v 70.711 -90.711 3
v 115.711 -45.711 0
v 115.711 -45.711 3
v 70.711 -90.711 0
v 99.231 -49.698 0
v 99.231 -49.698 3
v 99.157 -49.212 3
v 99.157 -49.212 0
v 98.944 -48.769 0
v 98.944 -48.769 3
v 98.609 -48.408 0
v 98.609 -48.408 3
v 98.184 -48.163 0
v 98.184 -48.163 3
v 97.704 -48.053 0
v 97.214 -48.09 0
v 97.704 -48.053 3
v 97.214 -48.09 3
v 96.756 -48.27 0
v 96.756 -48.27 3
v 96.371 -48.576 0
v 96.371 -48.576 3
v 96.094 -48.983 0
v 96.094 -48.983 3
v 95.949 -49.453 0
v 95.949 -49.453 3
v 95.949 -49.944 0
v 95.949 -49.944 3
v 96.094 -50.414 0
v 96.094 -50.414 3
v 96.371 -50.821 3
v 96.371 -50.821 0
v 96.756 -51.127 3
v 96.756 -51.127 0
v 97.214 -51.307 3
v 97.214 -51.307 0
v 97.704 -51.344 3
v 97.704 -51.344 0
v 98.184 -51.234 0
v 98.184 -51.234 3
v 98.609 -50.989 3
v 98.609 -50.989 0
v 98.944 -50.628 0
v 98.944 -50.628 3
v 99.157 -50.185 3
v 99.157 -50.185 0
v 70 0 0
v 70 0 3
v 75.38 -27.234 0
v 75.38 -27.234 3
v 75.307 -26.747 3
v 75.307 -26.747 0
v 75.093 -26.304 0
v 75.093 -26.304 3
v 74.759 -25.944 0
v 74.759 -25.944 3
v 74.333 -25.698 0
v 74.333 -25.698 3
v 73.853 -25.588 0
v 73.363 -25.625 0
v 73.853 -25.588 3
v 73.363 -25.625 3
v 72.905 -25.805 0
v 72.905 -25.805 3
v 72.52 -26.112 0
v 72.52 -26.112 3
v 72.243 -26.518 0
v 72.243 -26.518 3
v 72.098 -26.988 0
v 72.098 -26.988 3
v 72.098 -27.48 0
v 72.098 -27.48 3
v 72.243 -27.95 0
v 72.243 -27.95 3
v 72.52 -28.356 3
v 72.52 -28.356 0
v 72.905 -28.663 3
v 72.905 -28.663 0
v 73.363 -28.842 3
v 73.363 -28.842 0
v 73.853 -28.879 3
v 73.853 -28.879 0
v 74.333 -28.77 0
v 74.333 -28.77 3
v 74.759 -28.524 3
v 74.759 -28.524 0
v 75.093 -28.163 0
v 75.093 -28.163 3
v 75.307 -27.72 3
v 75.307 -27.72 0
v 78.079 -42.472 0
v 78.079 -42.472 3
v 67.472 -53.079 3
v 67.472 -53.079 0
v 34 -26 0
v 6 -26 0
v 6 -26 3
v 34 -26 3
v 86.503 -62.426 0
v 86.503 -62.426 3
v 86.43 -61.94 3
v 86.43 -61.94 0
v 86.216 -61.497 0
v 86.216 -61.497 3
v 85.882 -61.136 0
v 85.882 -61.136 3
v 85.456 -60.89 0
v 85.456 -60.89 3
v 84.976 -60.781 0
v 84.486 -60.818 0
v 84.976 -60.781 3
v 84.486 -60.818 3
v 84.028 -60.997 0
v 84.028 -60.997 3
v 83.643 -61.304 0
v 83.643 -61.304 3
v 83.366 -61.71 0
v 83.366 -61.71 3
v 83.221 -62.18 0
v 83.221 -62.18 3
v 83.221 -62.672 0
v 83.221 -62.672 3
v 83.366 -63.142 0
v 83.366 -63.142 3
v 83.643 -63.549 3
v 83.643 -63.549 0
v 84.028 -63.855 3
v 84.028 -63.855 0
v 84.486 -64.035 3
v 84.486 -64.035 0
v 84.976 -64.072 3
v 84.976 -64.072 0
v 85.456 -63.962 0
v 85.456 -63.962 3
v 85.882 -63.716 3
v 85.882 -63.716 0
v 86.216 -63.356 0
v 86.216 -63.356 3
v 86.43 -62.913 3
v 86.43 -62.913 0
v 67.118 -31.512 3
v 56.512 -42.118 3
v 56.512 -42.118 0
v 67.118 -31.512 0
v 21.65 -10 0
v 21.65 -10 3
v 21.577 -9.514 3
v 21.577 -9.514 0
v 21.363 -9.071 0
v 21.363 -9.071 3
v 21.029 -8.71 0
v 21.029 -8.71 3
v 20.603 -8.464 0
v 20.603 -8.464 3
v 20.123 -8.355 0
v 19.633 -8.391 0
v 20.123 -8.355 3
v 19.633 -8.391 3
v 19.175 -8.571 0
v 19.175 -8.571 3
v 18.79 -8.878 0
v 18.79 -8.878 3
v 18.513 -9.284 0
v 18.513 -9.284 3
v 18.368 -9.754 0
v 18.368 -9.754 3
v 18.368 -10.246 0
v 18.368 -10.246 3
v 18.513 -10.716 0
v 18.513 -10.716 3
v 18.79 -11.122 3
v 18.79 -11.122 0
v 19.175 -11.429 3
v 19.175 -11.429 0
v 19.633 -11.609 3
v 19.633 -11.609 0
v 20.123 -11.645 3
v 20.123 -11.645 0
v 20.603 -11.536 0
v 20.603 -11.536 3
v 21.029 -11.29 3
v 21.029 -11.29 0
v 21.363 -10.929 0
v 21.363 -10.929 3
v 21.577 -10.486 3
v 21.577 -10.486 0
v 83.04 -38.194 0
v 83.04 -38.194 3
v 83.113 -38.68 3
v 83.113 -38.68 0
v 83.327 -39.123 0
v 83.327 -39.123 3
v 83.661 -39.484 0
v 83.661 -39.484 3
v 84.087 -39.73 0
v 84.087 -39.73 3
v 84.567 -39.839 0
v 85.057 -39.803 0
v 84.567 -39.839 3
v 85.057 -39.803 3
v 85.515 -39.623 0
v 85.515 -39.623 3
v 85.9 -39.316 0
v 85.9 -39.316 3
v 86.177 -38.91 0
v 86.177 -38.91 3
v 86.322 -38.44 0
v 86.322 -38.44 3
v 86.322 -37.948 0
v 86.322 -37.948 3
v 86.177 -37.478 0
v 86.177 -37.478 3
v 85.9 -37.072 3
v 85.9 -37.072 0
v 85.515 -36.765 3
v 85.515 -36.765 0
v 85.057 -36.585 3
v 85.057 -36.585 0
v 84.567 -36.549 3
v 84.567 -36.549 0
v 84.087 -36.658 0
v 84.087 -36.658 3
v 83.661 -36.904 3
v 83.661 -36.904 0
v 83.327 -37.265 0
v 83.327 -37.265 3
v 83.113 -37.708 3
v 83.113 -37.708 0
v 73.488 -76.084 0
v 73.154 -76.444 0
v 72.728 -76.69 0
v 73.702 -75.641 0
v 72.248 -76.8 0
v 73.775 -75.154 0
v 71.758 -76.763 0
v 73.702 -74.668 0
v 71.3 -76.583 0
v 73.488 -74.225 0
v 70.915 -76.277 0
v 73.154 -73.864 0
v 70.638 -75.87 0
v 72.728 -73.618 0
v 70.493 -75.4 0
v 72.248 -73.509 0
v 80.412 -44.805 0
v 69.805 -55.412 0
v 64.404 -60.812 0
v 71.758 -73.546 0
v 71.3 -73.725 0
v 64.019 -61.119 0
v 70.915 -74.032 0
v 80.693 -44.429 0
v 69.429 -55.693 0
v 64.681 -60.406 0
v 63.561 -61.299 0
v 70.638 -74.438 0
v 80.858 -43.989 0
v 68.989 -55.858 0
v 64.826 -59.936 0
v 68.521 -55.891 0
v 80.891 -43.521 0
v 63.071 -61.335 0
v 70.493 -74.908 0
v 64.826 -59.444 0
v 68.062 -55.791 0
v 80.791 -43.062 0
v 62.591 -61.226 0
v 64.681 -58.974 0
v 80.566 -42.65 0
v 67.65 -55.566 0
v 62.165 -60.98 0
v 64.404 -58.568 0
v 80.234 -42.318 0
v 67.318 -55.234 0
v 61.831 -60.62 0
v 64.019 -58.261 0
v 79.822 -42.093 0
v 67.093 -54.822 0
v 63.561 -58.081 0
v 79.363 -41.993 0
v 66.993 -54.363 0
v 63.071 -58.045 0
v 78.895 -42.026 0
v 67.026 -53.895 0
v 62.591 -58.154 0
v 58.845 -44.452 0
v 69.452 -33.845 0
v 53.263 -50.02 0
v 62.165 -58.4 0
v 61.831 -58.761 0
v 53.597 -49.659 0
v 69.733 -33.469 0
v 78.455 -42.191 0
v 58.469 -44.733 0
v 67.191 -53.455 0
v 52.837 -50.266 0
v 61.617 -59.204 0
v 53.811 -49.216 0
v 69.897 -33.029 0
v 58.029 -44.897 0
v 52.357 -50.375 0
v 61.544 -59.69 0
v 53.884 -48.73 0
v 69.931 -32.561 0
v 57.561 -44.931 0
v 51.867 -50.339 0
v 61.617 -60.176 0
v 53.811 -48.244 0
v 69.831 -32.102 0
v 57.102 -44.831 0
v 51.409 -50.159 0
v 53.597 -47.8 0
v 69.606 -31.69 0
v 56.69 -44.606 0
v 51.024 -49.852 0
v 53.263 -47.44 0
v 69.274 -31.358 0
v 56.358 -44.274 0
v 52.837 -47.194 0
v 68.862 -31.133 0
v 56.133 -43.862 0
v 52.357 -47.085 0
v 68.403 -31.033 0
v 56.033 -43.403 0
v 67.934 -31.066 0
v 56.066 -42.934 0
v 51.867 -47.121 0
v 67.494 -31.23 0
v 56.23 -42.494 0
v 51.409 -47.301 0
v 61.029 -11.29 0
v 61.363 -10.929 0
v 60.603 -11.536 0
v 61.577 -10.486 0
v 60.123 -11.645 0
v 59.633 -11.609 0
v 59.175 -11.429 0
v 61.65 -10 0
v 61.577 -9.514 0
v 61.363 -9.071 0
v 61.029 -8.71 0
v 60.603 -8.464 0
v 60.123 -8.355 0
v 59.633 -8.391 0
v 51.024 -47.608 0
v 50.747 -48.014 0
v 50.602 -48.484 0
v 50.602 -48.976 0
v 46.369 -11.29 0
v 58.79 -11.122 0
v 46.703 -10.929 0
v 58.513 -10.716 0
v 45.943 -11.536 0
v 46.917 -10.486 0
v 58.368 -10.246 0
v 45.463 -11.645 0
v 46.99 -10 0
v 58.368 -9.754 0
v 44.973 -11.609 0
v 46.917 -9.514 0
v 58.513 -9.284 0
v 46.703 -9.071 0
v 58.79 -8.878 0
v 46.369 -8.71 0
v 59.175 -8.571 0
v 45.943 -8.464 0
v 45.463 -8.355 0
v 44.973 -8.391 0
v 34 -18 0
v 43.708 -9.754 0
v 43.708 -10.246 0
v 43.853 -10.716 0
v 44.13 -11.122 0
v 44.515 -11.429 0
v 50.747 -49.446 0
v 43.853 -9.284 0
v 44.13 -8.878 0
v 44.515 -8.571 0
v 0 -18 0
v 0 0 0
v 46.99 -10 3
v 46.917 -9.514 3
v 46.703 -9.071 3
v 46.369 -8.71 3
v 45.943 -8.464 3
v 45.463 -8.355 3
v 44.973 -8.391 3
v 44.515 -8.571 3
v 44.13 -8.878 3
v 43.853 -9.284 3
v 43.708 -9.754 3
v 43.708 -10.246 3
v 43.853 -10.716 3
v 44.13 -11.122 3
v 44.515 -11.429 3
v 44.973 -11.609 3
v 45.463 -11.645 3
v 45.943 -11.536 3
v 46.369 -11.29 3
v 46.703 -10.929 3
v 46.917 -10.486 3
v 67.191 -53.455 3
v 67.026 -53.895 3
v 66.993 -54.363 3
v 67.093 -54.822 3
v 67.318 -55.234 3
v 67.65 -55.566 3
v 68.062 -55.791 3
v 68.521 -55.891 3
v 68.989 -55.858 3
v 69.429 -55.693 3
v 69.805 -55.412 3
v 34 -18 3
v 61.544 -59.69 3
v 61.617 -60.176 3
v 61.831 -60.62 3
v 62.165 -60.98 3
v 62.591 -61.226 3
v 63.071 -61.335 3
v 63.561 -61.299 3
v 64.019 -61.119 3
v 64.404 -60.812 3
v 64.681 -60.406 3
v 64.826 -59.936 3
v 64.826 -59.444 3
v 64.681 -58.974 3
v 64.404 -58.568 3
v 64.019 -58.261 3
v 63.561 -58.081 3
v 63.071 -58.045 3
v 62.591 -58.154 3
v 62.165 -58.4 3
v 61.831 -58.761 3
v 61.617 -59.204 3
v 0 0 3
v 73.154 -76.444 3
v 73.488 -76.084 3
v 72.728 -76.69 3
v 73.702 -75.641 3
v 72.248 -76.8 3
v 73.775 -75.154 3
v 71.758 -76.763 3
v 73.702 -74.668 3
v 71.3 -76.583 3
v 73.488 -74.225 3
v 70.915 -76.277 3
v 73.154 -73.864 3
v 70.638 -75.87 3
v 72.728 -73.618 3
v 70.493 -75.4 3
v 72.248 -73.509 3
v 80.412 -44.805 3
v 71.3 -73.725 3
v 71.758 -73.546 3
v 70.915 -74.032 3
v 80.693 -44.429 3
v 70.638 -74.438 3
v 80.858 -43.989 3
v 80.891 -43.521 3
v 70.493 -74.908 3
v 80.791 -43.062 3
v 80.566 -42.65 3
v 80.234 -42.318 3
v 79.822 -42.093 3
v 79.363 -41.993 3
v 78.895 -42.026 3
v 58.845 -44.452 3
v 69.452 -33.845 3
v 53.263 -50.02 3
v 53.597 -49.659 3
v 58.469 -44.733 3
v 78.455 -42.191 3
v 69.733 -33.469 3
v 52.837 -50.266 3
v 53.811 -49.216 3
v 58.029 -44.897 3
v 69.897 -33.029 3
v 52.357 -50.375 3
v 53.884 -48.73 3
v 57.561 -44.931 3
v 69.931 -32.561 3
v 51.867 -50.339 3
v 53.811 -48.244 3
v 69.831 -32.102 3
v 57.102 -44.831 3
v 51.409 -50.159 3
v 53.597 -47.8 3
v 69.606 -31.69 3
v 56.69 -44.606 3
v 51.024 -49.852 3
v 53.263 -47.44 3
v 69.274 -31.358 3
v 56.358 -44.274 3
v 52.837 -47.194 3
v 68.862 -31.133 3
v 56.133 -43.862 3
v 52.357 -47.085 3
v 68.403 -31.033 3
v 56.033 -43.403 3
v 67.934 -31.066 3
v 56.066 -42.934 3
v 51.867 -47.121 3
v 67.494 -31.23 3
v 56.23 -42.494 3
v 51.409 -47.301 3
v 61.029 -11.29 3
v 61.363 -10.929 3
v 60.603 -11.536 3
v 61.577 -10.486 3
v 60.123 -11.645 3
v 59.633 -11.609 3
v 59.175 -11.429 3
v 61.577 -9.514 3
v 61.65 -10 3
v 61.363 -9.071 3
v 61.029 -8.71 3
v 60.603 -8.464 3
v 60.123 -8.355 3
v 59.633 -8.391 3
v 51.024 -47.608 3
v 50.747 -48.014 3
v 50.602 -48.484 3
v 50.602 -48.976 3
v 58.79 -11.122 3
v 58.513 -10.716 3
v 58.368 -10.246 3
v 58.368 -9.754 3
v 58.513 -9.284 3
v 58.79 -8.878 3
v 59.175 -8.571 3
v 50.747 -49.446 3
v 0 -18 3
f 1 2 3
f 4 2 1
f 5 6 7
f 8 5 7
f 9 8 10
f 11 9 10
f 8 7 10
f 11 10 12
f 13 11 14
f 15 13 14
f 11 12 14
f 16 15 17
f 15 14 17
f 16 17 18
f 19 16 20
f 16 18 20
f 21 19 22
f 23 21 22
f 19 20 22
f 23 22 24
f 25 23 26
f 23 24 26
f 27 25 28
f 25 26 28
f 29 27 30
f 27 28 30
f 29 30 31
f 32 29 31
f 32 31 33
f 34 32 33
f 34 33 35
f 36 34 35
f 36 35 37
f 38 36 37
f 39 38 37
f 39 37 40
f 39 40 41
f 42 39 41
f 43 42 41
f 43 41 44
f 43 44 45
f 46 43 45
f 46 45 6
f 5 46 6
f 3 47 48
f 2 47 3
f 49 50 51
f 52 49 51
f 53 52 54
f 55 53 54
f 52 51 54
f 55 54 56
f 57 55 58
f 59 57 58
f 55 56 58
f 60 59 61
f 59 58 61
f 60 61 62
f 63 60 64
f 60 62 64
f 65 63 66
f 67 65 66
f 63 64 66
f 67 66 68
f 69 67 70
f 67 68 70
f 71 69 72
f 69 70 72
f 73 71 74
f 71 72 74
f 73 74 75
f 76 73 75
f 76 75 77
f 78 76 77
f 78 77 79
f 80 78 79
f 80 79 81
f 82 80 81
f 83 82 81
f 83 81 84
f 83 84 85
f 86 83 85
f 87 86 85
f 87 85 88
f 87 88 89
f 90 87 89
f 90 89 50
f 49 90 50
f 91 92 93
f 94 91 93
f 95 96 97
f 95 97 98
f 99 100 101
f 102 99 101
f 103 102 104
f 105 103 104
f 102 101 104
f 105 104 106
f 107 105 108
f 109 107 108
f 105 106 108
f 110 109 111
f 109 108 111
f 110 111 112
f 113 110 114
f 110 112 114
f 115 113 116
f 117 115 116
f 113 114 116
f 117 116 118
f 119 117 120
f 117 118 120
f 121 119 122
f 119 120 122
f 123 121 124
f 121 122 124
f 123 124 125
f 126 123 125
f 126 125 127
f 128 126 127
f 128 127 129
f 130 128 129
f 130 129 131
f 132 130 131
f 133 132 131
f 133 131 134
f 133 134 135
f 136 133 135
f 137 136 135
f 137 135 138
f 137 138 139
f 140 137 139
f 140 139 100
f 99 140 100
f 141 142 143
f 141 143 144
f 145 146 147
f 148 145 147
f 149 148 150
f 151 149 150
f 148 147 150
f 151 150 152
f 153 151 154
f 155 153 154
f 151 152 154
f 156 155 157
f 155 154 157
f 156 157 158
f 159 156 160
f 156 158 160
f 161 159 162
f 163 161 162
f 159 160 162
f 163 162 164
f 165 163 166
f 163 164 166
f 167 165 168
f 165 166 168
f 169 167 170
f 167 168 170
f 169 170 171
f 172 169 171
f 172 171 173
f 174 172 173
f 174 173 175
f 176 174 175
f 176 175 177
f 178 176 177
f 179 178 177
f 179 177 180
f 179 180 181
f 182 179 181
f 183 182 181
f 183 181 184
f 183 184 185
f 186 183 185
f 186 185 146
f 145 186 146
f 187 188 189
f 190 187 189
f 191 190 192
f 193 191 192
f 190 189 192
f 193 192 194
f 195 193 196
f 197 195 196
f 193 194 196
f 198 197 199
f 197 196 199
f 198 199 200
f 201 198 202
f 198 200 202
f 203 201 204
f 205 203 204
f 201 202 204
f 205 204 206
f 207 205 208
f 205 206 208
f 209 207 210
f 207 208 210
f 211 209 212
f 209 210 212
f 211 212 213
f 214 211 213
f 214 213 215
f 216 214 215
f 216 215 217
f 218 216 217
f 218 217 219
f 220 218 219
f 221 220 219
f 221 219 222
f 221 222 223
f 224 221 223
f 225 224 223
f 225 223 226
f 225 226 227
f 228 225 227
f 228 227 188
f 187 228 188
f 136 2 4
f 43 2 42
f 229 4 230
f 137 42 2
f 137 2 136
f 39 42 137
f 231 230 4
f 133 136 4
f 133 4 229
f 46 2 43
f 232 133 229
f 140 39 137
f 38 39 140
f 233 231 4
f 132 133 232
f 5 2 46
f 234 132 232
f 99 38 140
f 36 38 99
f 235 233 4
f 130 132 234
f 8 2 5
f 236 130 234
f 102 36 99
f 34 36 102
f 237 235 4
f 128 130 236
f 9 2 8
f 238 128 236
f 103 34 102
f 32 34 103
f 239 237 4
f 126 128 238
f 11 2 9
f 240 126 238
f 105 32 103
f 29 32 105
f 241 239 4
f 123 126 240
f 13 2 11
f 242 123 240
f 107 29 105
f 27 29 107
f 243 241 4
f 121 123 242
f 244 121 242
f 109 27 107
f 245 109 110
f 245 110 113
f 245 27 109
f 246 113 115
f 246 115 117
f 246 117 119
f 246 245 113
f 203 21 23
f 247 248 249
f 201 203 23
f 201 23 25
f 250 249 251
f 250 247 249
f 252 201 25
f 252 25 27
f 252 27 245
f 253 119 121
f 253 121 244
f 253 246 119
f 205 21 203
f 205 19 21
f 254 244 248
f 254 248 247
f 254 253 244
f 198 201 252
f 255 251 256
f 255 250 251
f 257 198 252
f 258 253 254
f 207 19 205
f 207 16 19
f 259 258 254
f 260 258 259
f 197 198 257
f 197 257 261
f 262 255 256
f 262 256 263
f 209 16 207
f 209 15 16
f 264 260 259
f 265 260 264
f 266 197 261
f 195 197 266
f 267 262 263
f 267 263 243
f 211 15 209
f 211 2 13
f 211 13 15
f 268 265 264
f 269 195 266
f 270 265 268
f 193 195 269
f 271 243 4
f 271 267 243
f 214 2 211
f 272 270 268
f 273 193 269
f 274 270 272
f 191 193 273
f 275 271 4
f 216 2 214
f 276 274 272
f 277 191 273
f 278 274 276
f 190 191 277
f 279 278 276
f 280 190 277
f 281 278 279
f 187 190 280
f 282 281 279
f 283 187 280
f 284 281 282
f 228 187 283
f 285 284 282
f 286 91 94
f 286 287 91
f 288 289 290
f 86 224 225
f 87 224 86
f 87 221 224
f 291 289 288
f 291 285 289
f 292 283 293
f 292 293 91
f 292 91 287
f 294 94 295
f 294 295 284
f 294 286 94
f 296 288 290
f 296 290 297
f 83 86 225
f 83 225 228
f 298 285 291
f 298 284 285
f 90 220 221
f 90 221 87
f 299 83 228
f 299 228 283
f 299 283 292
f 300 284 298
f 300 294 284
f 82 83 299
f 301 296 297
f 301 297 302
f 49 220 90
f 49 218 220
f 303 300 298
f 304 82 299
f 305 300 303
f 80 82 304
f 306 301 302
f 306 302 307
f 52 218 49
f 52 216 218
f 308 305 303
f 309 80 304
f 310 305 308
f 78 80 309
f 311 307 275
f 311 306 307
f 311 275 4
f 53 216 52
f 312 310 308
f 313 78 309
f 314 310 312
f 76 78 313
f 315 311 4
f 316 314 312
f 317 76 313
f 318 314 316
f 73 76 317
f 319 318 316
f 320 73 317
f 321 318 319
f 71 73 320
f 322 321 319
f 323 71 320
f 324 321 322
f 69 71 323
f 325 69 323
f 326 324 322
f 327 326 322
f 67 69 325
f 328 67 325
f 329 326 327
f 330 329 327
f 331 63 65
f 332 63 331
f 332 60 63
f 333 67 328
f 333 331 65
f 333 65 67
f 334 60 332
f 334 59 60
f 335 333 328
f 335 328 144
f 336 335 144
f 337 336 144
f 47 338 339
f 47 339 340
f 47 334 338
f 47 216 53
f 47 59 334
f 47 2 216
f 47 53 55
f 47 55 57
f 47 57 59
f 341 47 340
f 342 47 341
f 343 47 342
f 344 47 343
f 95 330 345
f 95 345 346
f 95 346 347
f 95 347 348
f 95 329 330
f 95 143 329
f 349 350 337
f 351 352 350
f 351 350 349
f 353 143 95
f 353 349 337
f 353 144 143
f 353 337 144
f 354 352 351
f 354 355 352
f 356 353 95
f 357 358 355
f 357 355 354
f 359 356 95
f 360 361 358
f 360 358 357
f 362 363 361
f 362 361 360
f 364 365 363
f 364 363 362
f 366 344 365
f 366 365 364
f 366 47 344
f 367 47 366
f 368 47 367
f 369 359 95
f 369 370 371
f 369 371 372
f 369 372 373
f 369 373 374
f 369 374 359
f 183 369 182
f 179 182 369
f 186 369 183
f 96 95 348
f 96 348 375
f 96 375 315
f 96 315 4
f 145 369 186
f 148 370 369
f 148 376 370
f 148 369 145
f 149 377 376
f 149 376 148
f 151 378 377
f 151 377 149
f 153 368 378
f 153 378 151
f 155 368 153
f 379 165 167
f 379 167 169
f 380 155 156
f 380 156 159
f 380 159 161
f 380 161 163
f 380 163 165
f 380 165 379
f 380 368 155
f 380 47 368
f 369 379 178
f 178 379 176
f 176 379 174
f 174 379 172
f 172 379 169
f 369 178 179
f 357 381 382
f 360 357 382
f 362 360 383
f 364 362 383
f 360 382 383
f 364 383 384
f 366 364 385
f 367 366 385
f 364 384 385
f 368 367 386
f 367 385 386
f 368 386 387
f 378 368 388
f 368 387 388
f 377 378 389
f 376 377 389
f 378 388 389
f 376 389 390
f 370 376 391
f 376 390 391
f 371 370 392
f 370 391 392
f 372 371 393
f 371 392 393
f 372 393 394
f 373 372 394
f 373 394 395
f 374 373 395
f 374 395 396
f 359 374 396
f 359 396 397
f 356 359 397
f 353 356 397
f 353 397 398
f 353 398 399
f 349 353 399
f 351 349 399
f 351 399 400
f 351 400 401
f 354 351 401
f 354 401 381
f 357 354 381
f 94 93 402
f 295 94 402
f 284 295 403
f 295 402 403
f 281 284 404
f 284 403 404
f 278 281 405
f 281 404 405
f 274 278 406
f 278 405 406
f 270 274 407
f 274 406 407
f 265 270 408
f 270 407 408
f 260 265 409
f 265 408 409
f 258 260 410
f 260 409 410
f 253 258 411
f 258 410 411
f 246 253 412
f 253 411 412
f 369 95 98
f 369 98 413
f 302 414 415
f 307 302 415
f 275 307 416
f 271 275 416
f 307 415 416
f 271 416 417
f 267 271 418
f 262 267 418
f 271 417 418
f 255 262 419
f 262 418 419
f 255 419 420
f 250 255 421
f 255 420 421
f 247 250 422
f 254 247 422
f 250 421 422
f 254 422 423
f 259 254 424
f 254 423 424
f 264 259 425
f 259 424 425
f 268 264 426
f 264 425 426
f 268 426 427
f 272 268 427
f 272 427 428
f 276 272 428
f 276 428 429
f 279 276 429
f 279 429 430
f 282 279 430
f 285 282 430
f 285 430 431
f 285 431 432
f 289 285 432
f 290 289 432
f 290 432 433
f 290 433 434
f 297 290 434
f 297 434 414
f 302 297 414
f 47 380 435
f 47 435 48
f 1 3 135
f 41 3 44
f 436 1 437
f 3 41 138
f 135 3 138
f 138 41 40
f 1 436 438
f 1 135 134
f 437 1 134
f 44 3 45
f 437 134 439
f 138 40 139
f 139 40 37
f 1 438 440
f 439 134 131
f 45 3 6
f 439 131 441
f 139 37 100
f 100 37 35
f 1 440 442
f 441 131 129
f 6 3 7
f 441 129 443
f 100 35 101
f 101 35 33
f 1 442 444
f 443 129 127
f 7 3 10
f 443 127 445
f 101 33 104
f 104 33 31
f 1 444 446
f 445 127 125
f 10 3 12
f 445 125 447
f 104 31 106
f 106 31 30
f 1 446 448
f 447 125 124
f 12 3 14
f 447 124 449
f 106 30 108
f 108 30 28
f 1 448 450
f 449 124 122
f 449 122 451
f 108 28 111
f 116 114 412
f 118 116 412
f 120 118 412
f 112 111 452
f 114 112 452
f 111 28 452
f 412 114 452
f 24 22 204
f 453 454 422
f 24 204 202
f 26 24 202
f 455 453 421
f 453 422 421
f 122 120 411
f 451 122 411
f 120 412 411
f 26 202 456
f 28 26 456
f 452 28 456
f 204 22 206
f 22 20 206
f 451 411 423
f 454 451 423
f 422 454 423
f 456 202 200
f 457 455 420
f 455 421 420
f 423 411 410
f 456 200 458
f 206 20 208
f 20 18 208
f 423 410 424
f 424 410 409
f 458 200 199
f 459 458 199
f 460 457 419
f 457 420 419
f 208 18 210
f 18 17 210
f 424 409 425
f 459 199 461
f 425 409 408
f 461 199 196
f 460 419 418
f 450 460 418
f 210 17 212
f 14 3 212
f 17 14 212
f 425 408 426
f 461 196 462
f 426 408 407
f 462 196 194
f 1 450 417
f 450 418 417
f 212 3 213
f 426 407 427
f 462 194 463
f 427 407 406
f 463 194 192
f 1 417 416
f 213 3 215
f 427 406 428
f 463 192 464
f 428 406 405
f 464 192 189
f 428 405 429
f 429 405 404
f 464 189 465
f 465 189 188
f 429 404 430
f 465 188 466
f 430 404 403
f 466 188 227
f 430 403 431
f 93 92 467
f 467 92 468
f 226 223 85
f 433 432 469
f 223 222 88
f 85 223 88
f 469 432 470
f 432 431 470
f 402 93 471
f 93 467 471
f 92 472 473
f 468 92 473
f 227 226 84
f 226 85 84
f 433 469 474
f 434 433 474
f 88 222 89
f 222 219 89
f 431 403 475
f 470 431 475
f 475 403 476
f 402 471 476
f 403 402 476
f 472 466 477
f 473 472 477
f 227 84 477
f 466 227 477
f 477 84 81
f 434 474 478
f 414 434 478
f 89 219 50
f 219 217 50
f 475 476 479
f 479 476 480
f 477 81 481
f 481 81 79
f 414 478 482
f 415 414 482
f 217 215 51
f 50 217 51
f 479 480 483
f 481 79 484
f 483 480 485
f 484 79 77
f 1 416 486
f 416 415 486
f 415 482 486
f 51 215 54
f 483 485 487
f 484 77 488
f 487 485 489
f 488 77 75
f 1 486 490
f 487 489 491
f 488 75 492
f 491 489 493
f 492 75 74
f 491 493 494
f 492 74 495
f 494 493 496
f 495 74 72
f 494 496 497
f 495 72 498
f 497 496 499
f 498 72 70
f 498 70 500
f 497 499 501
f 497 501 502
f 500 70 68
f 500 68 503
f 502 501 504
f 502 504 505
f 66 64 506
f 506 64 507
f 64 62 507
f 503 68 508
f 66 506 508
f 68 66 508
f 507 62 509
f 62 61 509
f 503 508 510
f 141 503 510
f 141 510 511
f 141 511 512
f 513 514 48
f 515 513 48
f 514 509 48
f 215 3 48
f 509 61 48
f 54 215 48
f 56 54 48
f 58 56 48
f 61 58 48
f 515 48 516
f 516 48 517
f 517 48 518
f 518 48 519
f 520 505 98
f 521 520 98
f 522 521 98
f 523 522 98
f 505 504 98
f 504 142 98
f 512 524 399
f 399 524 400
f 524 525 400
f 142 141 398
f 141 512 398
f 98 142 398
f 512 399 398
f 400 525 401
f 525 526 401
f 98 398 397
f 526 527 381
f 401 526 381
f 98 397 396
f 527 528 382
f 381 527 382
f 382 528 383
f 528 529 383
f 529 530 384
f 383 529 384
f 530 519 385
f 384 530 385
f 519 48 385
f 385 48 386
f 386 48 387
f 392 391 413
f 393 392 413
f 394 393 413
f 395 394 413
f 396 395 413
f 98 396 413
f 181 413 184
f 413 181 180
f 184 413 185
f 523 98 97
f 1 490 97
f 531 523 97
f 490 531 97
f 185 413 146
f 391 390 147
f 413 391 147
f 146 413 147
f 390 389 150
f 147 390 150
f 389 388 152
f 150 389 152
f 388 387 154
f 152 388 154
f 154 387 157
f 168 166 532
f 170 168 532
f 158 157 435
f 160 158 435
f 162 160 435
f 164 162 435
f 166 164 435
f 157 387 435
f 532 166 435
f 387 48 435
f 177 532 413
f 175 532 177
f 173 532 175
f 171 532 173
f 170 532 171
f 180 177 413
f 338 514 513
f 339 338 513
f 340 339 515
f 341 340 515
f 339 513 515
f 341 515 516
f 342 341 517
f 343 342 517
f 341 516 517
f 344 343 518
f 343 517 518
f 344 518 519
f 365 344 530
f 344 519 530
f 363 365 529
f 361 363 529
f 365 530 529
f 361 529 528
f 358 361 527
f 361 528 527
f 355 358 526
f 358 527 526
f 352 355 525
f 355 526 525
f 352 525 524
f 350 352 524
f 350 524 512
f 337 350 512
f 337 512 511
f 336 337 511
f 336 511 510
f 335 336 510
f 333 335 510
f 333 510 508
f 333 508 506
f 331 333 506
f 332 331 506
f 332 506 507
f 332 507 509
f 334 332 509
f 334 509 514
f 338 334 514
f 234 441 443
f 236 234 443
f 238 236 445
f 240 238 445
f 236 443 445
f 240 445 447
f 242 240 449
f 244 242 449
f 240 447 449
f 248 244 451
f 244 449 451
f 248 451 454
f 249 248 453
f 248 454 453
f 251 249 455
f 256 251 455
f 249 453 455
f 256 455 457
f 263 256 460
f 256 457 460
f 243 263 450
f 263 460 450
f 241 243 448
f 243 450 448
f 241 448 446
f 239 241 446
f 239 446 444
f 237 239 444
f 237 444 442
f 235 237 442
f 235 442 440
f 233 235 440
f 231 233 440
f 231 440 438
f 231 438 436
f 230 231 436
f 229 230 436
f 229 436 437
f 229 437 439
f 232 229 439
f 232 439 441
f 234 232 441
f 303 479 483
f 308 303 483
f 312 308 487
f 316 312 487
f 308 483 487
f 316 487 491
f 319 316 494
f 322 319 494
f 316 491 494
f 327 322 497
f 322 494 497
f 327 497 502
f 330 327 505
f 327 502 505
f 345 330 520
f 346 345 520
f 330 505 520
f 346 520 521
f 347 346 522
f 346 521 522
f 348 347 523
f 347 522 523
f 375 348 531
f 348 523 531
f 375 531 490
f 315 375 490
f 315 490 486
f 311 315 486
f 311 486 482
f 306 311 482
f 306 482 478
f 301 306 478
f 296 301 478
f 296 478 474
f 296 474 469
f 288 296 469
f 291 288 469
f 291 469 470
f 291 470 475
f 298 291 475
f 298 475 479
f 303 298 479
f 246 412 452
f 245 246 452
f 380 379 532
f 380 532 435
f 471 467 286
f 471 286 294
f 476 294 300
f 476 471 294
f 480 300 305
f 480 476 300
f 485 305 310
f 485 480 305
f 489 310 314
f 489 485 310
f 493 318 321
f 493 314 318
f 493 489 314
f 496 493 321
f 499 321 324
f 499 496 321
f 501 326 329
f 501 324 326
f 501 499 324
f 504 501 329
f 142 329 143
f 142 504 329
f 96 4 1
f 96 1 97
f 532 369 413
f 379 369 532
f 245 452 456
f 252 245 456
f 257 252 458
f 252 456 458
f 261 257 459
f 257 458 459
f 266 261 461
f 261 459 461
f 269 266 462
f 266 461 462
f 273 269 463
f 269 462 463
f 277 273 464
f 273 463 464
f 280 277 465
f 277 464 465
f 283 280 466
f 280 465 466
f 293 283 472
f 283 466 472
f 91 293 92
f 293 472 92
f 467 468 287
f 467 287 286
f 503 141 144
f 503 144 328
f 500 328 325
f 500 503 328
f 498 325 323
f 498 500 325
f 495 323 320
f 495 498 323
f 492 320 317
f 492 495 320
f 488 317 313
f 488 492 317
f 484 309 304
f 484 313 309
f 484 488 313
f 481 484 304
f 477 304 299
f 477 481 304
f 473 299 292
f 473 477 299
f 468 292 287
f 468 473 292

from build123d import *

# Parameters (mm, degrees)
EXTRUDE_1_DEPTH     = 3
SKETCH_2_R          = 1.65
CUT_EXTRUDE_1_DEPTH = 148.059131493
CUT_EXTRUDE_2_DEPTH = 10


with BuildPart() as part:
    # 草图1 → 凸台-拉伸1 (new body)
    with BuildSketch(Plane.XY):
        Polygon((0, 0), (70, 0), (115.710678119, -45.710678119), (70.710678119, -90.710678119), (0, -20), align=None)
    extrude(amount=EXTRUDE_1_DEPTH)

    # 草图2 → 切除-拉伸1 (cut, through all)
    with BuildSketch(Plane.XY.offset(3)):
        with Locations((72.124891681, -75.154328933)):
            Circle(SKETCH_2_R)
        with Locations((97.580735804, -49.69848481)):
            Circle(SKETCH_2_R)
        with Locations((20, -10)):
            Circle(SKETCH_2_R)
        with Locations((45.34, -10)):
            Circle(SKETCH_2_R)
        with Locations((60, -10)):
            Circle(SKETCH_2_R)
        with Locations((73.729886297, -27.233840149)):
            Circle(SKETCH_2_R)
        with Locations((52.233840149, -48.729886297)):
            Circle(SKETCH_2_R)
        with Locations(Location((84.690041405, -38.193995257, 0), (0, 0, 180))):
            Circle(SKETCH_2_R)
        with Locations(Location((63.193995257, -59.690041405, 0), (0, 0, 180))):
            Circle(SKETCH_2_R)
        with Locations((84.852813742, -62.426406871)):
            Circle(SKETCH_2_R)
        with BuildLine():
            Line((56.511836175, -42.118437893), (67.118437893, -31.511836175))
            ThreePointArc((67.118437893, -31.511836175), (69.451890271, -31.511836175), (69.451890271, -33.845288553))
            Line((69.451890271, -33.845288553), (58.845288553, -44.451890271))
            ThreePointArc((58.845288553, -44.451890271), (56.511836175, -44.451890271), (56.511836175, -42.118437893))
        make_face()
        with BuildLine():
            Line((69.805443661, -55.412045379), (80.412045379, -44.805443661))
            ThreePointArc((80.412045379, -44.805443661), (80.412045379, -42.471991283), (78.078593001, -42.471991283))
            Line((78.078593001, -42.471991283), (67.471991283, -53.078593001))
            ThreePointArc((67.471991283, -53.078593001), (67.471991283, -55.412045379), (69.805443661, -55.412045379))
        make_face()
    extrude(amount=-CUT_EXTRUDE_1_DEPTH, mode=Mode.SUBTRACT)

    # 草图3 → 切除-拉伸2 (cut)
    with BuildSketch(Plane(origin=(0, 0, 0), x_dir=(-1, 0, 0), z_dir=(0, 0, -1))):
        Polygon((-34, -18), (2, -18), (-6, -26), (-34, -26), align=None)
    extrude(amount=-CUT_EXTRUDE_2_DEPTH, mode=Mode.SUBTRACT)


solid = part.part
